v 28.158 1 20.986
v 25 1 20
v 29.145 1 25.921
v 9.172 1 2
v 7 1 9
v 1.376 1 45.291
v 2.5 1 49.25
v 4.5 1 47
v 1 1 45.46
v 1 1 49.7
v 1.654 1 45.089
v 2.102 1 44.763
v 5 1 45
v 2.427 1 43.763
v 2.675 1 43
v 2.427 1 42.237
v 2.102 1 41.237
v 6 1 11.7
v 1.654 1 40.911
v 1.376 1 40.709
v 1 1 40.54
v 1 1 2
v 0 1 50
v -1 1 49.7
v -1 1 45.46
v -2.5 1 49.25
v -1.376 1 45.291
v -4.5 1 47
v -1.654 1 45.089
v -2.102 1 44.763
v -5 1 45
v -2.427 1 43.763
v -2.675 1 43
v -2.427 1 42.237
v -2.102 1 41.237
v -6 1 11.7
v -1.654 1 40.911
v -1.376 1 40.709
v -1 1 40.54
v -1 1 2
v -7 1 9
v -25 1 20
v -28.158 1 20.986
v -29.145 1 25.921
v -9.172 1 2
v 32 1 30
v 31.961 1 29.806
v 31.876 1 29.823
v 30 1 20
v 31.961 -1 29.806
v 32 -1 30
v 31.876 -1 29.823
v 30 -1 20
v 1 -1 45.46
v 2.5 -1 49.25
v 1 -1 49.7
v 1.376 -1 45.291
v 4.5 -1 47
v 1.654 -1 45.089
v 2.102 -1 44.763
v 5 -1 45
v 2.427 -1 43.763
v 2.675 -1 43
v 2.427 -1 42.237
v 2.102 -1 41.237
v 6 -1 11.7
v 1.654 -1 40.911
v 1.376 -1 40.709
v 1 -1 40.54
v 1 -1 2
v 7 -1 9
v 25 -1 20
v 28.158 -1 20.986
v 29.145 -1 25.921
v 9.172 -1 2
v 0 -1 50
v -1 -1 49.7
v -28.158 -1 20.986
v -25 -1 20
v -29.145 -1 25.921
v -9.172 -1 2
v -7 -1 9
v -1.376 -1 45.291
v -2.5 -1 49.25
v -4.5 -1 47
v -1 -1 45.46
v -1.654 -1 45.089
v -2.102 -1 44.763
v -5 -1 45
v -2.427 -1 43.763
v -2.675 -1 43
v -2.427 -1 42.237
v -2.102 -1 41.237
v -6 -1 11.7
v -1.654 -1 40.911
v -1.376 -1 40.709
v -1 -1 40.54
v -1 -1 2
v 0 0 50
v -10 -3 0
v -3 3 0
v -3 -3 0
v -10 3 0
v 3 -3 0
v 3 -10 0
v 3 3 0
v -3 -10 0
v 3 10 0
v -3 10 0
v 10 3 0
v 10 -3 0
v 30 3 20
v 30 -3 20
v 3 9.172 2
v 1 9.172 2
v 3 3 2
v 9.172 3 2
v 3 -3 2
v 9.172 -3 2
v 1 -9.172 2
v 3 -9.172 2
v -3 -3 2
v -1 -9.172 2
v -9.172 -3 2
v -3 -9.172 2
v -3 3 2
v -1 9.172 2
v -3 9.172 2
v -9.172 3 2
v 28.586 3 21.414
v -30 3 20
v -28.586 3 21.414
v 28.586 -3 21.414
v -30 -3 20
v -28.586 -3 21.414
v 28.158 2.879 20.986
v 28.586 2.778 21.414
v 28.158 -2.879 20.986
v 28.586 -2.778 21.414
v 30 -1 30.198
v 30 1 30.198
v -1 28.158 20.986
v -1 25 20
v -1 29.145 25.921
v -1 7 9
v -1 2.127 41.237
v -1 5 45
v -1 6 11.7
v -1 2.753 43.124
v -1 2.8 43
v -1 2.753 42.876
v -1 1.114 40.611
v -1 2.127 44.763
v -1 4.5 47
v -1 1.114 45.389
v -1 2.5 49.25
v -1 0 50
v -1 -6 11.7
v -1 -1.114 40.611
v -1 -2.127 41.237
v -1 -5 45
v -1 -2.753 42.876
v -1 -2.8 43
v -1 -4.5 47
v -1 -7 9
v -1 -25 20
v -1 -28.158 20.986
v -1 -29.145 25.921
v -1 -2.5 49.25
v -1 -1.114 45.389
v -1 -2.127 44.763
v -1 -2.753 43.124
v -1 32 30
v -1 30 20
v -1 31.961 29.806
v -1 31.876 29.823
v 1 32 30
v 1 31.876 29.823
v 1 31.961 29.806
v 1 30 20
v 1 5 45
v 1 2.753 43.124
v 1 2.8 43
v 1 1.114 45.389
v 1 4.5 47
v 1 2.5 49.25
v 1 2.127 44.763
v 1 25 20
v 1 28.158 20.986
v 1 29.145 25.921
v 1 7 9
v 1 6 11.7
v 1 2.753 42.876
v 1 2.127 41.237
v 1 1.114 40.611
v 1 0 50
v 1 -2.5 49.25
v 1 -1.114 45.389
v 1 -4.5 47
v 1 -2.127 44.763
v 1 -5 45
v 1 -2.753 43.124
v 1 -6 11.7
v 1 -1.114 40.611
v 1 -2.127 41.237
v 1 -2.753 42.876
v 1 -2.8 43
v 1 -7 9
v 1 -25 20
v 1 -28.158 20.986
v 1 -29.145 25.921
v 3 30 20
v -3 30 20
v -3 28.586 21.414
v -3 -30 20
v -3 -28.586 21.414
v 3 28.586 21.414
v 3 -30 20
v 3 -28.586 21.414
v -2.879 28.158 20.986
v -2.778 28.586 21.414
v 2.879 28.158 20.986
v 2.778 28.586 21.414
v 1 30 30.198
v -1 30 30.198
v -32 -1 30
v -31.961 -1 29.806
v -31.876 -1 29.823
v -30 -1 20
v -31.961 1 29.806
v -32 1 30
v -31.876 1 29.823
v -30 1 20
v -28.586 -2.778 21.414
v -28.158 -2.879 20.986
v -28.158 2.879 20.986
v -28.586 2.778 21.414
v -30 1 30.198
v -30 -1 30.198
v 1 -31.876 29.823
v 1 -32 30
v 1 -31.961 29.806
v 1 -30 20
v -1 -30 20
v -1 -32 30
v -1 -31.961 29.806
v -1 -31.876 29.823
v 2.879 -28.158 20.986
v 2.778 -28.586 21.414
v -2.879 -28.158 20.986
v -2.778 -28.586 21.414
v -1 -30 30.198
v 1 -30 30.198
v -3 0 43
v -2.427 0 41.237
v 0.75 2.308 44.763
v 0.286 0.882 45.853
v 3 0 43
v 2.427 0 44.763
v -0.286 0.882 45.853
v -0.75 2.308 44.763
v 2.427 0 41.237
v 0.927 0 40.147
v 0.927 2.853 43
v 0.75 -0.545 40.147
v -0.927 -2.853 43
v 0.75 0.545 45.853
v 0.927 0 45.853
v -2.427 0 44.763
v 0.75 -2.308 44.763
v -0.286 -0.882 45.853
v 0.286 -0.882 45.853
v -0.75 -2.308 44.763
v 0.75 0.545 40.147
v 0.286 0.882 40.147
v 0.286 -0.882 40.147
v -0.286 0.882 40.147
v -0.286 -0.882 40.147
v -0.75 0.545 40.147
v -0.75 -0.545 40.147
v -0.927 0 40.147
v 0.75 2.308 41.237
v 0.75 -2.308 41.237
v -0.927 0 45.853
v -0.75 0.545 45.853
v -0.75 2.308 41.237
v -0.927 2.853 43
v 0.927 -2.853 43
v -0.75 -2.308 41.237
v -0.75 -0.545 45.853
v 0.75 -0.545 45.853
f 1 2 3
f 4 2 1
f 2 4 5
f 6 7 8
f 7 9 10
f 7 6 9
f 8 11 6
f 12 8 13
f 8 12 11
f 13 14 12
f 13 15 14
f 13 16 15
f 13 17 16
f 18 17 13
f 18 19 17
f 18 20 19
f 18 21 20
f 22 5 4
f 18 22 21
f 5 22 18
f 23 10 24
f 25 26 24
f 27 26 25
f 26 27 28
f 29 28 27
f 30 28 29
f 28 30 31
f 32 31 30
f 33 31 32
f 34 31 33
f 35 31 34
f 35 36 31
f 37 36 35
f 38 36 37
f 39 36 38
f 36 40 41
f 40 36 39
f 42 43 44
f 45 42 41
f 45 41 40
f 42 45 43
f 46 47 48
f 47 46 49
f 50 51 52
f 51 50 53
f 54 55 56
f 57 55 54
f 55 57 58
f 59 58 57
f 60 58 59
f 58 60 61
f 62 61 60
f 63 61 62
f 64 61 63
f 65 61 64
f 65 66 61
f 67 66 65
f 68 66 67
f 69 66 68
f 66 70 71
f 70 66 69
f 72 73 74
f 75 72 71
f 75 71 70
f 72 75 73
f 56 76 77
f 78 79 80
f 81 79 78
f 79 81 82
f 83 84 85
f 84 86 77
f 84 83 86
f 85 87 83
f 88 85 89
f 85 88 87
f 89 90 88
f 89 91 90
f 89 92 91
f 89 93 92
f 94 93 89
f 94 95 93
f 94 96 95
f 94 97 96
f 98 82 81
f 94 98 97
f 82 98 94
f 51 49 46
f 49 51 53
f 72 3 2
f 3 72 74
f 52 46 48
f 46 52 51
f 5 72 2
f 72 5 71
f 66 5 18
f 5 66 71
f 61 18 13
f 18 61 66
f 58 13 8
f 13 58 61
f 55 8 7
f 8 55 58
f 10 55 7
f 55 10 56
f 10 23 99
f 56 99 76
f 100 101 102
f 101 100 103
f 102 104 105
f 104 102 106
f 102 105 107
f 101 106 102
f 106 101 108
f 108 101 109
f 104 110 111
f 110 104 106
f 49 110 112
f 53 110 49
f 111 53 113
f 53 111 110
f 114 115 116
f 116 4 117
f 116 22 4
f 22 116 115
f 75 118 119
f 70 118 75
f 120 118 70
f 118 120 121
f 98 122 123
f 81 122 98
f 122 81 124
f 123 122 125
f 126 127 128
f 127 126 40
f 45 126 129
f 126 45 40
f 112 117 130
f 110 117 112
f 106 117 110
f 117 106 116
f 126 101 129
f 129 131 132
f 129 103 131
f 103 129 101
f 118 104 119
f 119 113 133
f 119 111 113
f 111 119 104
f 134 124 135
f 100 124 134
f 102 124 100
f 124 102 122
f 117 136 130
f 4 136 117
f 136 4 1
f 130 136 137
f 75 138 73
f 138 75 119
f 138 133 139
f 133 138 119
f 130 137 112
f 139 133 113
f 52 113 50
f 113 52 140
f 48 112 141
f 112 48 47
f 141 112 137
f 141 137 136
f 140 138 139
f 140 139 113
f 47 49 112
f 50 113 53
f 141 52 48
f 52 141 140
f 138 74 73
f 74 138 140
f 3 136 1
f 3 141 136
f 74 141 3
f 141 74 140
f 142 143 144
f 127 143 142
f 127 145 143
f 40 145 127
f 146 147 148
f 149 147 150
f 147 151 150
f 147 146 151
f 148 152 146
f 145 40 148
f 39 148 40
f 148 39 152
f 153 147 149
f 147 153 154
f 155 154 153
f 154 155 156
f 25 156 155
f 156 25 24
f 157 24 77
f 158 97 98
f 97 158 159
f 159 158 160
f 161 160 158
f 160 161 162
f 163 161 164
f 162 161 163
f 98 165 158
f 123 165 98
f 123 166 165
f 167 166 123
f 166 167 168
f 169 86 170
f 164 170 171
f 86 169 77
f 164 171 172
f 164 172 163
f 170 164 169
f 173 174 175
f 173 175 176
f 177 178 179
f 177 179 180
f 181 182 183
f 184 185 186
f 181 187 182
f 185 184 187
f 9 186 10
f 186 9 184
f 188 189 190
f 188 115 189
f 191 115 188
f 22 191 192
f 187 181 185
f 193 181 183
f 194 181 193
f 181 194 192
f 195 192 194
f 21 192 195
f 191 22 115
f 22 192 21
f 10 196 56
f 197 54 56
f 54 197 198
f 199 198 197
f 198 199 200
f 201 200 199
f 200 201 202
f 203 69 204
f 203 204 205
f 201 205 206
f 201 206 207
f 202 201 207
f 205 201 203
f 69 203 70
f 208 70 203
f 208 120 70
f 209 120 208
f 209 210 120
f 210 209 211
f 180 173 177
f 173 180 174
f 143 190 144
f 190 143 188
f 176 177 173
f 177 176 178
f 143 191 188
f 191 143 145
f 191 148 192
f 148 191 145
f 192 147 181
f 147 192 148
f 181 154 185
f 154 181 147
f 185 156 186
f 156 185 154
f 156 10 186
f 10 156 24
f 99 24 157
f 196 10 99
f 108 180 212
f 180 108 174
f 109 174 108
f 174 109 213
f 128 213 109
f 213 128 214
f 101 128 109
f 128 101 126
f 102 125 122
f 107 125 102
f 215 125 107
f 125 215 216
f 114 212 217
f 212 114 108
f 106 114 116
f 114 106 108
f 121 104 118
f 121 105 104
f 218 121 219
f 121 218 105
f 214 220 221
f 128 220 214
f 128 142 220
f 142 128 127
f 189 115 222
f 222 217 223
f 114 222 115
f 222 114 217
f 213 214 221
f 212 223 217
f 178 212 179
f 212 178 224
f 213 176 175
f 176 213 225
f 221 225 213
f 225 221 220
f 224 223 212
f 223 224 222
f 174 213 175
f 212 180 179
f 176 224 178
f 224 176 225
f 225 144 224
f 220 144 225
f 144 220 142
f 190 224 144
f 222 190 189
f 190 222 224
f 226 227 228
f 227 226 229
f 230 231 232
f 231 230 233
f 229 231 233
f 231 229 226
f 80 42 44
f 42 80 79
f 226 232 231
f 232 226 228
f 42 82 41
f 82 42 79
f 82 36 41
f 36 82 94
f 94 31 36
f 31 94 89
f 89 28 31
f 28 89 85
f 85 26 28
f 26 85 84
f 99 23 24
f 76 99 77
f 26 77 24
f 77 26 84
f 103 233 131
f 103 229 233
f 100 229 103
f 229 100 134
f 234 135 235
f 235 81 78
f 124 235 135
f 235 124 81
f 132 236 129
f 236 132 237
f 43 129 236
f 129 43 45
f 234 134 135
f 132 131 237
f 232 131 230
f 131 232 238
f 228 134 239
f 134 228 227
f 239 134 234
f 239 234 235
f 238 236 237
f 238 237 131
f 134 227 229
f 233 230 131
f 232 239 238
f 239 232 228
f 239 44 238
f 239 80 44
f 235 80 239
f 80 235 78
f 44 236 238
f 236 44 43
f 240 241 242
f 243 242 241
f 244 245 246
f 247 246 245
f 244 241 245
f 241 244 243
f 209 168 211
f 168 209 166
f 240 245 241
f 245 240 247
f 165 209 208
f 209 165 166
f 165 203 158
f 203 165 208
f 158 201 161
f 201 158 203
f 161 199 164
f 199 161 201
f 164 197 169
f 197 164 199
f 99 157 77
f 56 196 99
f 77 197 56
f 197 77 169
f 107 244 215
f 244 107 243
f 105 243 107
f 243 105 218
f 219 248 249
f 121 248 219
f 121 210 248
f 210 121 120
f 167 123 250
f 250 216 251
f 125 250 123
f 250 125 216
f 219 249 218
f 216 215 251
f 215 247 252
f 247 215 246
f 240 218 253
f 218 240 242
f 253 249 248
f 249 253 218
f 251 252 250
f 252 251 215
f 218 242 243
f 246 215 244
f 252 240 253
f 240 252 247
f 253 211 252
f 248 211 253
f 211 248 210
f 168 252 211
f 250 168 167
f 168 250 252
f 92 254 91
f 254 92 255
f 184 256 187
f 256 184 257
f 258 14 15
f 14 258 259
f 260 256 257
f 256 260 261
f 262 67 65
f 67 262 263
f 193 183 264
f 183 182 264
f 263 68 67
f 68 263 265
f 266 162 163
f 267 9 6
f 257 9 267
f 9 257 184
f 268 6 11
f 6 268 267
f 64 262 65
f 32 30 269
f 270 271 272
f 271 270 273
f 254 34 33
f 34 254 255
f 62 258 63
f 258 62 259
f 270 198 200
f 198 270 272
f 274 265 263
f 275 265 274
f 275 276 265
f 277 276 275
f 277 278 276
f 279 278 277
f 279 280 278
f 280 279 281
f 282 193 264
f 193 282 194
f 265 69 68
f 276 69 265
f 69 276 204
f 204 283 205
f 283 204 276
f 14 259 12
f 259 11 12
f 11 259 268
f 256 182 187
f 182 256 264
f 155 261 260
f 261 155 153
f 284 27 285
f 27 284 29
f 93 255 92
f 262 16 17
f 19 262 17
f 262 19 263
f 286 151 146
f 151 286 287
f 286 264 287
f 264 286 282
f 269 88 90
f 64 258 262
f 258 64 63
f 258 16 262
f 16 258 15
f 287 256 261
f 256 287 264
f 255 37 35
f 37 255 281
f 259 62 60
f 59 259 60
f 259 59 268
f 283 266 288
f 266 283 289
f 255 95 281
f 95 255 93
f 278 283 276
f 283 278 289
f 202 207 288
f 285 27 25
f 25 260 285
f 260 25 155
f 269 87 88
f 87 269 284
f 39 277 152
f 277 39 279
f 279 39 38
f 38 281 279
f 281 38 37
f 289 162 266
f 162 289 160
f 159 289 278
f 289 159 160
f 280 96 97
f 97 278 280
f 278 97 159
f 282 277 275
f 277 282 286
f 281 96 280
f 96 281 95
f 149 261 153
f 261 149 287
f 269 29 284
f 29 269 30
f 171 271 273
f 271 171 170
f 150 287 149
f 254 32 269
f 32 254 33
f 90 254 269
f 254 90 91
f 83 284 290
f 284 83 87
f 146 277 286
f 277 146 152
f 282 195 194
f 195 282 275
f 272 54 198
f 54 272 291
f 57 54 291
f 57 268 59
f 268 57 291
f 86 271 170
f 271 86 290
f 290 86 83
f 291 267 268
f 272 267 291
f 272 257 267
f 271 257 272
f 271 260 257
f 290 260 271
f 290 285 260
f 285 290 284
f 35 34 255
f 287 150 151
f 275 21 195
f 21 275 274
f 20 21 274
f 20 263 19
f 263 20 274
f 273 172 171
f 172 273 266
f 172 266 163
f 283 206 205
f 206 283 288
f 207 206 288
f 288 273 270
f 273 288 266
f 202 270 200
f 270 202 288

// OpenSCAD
use <MCAD/2Dshapes.scad>

module triangle (w_b, h, l, centre = false)
{

    points = [
    [0,0],
    [w_b,0],
    [w_b/2,h],
    ];

    trans = (centre == true) ? [-w_b/2,-h/2,0] : [0,0,0] ;

    translate(trans)
        linear_extrude(l)
            polygon(points);
}

module trapezoid (w_b, w_t, h, l, centre = false)
{
    top_offset = ( w_b - w_t )/2;

    points = [
    [0,0],
    [w_b,0],
    [top_offset+w_t,h],
    [top_offset,h]
    ];

    trans = (centre == true) ? [-w_b/2,-h/2,0] : [0,0,0] ;

    translate(trans)
        linear_extrude(l)
            polygon(points);
}



w_shaft = 5;
l_shaft = 50;
w_head = 10;
h_head = 9;
w_arm = 30;
h_arm = 20;
w_arm_end = 5;
point_width = 2;
point_height = 10;
w_point = w_arm + point_width;
h_point = h_arm + point_height;
w_reinforcer = 6;
thk_reinforcer = 2;
thk_hook = 2;
num_hooks = 4;

hole_dia = 6;

grap_points = 
[
[0,0],
[w_head,            0],
[w_arm,             h_arm],
[w_point,           h_point],
[w_arm-w_arm_end,   h_arm],
[w_shaft * 1.4,           h_head],
[w_shaft * 1.2,           h_head * 1.3],
[w_shaft,           l_shaft-w_shaft],
[(0.9)*w_shaft,     l_shaft-(0.6)*w_shaft],
[(0.5)*w_shaft,     l_shaft-(0.15)*w_shaft],
[0,l_shaft], 
[0,0]
];

module arm()
{
    union()
    {
    rotate([90,0,0])
        linear_extrude(height=thk_hook,center=true)
            {
                polygon(grap_points);
            }
     translate([0,-w_reinforcer/2,0])
                cube([w_head,w_reinforcer,thk_reinforcer]);
            
      l_arm_flange = sqrt ( pow(h_arm, 2) + pow(w_arm-w_head, 2));
            
      arm_flange_angle = atan( (w_arm-w_head)/h_arm );
            
      translate([w_head,-w_reinforcer/2,0])
        rotate([0,-arm_flange_angle,0])
            cube([l_arm_flange,w_reinforcer,thk_reinforcer]);
            
      //l_arm_flange = sqrt ( pow(h_arm, 2) + pow(w_arm-w_head, 2));
      
      w_point = w_arm + point_width;
      h_point = h_arm + point_height;
      arm_point_angle = atan( (point_height)/point_width );
            
            rotate([0,0,-90])
             translate([-w_reinforcer/2,w_arm,h_arm])           
      rotate([arm_point_angle,0,0])
        
            trapezoid(w_reinforcer,thk_hook,point_height,thk_reinforcer,0);      
            
      }
}

difference()
{
    union()
    {
	
rot_angle = 360/num_hooks;
for(i = [0: rot_angle: 359])
{
    echo(i);
    rotate([0,0,i])
arm();
}


//    arm();
//    rotate([0,0,120])
//        arm();
//    rotate([0,0,2*120])
//        arm();
    }
    
    translate([0,0,l_shaft-w_shaft-2])
        sphere(d=hole_dia);
}
